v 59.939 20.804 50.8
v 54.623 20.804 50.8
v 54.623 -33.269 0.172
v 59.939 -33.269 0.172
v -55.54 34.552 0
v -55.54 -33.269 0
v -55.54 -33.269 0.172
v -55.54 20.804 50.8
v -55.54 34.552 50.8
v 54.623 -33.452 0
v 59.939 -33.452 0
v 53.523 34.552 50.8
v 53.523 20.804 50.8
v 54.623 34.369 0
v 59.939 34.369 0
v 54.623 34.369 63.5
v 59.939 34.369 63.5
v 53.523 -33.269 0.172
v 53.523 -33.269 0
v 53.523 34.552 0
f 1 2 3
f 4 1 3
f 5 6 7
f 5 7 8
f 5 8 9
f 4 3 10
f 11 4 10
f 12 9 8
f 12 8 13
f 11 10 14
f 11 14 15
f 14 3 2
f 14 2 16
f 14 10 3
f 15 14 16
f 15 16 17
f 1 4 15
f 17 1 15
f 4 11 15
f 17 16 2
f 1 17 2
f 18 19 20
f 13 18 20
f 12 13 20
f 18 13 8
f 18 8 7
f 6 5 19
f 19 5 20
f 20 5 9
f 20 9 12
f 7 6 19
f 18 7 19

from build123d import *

# Parameters (mm, degrees)
F0_W     = 109.0628877282
F0_H     = 67.8206197917
F1_DEPTH = 50.8
F2_W     = 5.3156651556
F2_H     = 67.8206197917
F3_DEPTH = 63.5
F5_DEPTH = 127


# Not quite as in the source:
# - a feature of the source that left no trace in its solid (it failed there, or was rolled back) is left out


with BuildPart() as f1:
    # F0 (on Top) → F1 (new body)
    with BuildSketch(Plane.XY):
        with Locations((-1.0081455112, 0.6415452808)):
            Rectangle(F0_W, F0_H)
    extrude(amount=F1_DEPTH)


with BuildPart() as f3:
    # F2 (on Top) → F3 (new body)
    with BuildSketch(Plane.XY):
        with Locations((57.2809297591, 0.458246097)):
            Rectangle(F2_W, F2_H)
    extrude(amount=F3_DEPTH)


with BuildPart() as f5_tool:
    # F4 (on face) → F5 (new body)
    with BuildSketch(Plane(origin=(-55.5395893753, 0, 0), x_dir=(0, -1, 0), z_dir=(-1, 0, 0))):
        Polygon((-34.3685559928, 63.5), (-20.8044320345, 50.8), (33.2687646151, 50.8), (33.2687646151, 0.1716218196), (33.4520637989, 0), (33.4520637989, 63.5), align=None)
        Polygon((33.2687646151, 50.8), (-20.8044320345, 50.8), (33.2687646151, 0.1716218196), align=None)
    extrude(amount=-F5_DEPTH)


with BuildPart() as f1_1:
    add(f1.part)

    # F5: cut by f5_tool
    add(f5_tool.part, mode=Mode.SUBTRACT)


with BuildPart() as f3_1:
    add(f3.part)

    # F5: cut by f5_tool
    add(f5_tool.part, mode=Mode.SUBTRACT)


solid = Compound([f1_1.part, f3_1.part])
